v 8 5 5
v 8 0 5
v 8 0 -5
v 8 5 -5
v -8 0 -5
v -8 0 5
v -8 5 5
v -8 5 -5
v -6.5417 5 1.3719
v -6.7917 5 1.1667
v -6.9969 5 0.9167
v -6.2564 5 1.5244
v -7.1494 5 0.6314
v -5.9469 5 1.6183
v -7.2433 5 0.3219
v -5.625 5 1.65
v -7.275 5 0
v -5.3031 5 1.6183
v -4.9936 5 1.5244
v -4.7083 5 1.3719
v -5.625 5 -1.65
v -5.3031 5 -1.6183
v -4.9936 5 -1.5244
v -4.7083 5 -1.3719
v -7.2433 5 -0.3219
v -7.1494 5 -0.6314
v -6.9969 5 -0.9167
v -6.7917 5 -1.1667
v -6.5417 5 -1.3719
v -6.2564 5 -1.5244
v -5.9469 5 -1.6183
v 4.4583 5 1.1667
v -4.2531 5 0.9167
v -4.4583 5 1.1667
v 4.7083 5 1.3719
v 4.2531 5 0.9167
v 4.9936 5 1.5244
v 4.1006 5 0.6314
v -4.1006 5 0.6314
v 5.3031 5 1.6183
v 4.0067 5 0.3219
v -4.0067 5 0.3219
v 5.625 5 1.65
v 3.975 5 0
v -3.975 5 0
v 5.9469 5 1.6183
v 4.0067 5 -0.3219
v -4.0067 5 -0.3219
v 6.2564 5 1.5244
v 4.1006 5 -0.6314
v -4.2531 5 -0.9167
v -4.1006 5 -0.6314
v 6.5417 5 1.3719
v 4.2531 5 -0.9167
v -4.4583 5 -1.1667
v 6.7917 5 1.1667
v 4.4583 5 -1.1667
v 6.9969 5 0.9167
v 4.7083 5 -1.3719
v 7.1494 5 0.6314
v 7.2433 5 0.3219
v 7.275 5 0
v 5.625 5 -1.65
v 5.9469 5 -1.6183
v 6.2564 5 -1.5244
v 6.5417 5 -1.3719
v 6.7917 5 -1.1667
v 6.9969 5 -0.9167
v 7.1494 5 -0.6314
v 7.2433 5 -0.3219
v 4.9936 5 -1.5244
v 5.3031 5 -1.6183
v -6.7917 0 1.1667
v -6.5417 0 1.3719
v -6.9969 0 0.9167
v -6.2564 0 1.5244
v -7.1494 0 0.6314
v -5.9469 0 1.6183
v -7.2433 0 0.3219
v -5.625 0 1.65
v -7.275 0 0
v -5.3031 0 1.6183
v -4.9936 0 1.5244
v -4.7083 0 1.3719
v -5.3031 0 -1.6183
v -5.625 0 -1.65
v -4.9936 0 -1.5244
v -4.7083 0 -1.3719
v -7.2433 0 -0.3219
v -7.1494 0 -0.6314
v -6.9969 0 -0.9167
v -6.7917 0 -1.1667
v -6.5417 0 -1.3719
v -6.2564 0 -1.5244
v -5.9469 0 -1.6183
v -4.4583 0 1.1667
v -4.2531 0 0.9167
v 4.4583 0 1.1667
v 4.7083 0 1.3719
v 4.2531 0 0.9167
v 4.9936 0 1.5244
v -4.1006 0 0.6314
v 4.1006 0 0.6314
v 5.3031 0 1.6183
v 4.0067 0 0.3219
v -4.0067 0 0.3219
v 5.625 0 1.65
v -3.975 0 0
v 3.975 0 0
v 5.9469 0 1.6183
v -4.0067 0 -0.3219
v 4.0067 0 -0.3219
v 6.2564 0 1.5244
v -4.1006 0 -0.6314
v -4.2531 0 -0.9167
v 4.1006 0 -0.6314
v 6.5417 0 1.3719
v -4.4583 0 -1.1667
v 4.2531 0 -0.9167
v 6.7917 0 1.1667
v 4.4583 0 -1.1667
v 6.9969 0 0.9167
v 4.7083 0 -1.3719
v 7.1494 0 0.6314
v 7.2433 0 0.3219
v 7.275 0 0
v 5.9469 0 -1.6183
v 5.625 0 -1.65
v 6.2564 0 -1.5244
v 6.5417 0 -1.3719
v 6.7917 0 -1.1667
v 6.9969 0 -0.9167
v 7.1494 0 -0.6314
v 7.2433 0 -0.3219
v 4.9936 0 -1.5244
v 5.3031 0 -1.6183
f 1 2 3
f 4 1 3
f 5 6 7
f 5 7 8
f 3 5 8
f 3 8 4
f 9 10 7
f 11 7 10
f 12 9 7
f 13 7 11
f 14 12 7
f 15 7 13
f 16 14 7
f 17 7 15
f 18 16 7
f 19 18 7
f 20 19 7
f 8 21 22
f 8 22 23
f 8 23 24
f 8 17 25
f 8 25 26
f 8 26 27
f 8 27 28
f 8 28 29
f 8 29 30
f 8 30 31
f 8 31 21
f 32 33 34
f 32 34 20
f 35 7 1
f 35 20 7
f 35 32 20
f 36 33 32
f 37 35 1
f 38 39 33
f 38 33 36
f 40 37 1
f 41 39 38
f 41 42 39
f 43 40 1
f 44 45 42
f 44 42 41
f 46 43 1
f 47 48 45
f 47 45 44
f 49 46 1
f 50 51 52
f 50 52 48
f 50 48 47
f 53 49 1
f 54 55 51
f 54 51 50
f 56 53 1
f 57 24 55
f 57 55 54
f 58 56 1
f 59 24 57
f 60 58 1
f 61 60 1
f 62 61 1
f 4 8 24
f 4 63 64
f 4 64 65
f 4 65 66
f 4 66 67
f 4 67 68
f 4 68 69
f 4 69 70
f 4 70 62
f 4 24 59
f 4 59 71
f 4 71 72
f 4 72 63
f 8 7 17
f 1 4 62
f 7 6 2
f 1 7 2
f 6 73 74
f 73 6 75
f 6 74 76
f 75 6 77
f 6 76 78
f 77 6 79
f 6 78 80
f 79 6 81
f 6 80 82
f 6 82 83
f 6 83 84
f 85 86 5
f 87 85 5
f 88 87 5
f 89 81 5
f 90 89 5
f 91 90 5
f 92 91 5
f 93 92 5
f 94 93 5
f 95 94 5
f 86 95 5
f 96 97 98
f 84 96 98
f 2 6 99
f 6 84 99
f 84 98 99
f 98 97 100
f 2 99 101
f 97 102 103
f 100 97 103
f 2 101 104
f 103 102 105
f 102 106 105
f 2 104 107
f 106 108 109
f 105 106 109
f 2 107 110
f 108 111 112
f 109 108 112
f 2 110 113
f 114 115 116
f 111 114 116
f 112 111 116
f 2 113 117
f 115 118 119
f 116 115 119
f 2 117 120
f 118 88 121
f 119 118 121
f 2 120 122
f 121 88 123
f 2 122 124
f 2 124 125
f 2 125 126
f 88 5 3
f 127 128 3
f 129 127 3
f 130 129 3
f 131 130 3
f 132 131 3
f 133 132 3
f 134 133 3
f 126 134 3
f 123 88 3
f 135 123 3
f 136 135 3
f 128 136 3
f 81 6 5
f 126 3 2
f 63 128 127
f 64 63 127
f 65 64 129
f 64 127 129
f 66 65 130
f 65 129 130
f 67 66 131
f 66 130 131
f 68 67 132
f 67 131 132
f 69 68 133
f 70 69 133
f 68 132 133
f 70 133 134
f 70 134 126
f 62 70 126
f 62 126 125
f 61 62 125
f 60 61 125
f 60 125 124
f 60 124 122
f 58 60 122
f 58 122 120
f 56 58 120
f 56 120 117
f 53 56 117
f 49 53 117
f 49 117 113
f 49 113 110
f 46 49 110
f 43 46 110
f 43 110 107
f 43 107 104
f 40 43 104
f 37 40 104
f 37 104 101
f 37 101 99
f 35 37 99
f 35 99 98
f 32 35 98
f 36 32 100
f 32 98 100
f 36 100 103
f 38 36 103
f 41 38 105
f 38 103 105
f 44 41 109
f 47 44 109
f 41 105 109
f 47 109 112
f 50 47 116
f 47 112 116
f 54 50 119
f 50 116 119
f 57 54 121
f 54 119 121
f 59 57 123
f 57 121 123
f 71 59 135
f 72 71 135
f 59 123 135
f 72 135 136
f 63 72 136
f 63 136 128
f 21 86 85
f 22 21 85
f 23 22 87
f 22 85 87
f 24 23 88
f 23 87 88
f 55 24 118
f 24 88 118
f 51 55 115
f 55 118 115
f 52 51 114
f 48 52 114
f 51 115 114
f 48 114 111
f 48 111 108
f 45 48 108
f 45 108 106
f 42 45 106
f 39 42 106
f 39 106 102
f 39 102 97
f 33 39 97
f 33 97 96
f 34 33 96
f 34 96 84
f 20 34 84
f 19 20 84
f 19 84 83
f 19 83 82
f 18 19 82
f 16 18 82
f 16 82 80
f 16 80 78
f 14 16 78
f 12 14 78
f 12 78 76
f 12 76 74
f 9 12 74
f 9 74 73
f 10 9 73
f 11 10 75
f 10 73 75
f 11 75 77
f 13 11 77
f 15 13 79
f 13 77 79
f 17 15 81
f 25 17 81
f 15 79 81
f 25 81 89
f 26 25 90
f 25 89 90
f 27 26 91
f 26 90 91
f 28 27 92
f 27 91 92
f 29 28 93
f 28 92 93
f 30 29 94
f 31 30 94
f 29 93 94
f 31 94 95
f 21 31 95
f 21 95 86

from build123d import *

# Parameters (mm, degrees)
CROQUIS1_W              = 16
CROQUIS1_H              = 10
SALIENTE_EXTRUIR1_DEPTH = 5
CORTAR_EXTRUIR1_REACH   = 12.677
CROQUIS2_R              = 1.65


with BuildPart() as part:
    # Croquis1 → Saliente-Extruir1 (new body)
    with BuildSketch(Plane(origin=(0, 0, 0), x_dir=(1, 0, 0), z_dir=(0, 1, 0))):
        Rectangle(CROQUIS1_W, CROQUIS1_H)
    extrude(amount=SALIENTE_EXTRUIR1_DEPTH)

    # Croquis2 → Cortar-Extruir1 (cut, up to next)
    with BuildSketch(Plane.XZ, mode=Mode.PRIVATE) as cortar_extruir1_sk1:
        with Locations(Location((-5.625, 0, 0), (0, 0, 270))):
            Circle(CROQUIS2_R)
    cortar_extruir1_tool1 = extrude(cortar_extruir1_sk1.sketch, amount=-CORTAR_EXTRUIR1_REACH, mode=Mode.PRIVATE) & part.part
    # Croquis2 → Cortar-Extruir1 (cut, up to next)
    with BuildSketch(Plane.XZ, mode=Mode.PRIVATE) as cortar_extruir1_sk2:
        with Locations(Location((5.625, 0, 0), (0, 0, 270))):
            Circle(CROQUIS2_R)
    cortar_extruir1_tool2 = extrude(cortar_extruir1_sk2.sketch, amount=-CORTAR_EXTRUIR1_REACH, mode=Mode.PRIVATE) & part.part
    add(cortar_extruir1_tool1.solids().sort_by_distance((-5.625, 0, 0))[0], mode=Mode.SUBTRACT)
    add(cortar_extruir1_tool2.solids().sort_by_distance((5.625, 0, 0))[0], mode=Mode.SUBTRACT)


solid = part.part
